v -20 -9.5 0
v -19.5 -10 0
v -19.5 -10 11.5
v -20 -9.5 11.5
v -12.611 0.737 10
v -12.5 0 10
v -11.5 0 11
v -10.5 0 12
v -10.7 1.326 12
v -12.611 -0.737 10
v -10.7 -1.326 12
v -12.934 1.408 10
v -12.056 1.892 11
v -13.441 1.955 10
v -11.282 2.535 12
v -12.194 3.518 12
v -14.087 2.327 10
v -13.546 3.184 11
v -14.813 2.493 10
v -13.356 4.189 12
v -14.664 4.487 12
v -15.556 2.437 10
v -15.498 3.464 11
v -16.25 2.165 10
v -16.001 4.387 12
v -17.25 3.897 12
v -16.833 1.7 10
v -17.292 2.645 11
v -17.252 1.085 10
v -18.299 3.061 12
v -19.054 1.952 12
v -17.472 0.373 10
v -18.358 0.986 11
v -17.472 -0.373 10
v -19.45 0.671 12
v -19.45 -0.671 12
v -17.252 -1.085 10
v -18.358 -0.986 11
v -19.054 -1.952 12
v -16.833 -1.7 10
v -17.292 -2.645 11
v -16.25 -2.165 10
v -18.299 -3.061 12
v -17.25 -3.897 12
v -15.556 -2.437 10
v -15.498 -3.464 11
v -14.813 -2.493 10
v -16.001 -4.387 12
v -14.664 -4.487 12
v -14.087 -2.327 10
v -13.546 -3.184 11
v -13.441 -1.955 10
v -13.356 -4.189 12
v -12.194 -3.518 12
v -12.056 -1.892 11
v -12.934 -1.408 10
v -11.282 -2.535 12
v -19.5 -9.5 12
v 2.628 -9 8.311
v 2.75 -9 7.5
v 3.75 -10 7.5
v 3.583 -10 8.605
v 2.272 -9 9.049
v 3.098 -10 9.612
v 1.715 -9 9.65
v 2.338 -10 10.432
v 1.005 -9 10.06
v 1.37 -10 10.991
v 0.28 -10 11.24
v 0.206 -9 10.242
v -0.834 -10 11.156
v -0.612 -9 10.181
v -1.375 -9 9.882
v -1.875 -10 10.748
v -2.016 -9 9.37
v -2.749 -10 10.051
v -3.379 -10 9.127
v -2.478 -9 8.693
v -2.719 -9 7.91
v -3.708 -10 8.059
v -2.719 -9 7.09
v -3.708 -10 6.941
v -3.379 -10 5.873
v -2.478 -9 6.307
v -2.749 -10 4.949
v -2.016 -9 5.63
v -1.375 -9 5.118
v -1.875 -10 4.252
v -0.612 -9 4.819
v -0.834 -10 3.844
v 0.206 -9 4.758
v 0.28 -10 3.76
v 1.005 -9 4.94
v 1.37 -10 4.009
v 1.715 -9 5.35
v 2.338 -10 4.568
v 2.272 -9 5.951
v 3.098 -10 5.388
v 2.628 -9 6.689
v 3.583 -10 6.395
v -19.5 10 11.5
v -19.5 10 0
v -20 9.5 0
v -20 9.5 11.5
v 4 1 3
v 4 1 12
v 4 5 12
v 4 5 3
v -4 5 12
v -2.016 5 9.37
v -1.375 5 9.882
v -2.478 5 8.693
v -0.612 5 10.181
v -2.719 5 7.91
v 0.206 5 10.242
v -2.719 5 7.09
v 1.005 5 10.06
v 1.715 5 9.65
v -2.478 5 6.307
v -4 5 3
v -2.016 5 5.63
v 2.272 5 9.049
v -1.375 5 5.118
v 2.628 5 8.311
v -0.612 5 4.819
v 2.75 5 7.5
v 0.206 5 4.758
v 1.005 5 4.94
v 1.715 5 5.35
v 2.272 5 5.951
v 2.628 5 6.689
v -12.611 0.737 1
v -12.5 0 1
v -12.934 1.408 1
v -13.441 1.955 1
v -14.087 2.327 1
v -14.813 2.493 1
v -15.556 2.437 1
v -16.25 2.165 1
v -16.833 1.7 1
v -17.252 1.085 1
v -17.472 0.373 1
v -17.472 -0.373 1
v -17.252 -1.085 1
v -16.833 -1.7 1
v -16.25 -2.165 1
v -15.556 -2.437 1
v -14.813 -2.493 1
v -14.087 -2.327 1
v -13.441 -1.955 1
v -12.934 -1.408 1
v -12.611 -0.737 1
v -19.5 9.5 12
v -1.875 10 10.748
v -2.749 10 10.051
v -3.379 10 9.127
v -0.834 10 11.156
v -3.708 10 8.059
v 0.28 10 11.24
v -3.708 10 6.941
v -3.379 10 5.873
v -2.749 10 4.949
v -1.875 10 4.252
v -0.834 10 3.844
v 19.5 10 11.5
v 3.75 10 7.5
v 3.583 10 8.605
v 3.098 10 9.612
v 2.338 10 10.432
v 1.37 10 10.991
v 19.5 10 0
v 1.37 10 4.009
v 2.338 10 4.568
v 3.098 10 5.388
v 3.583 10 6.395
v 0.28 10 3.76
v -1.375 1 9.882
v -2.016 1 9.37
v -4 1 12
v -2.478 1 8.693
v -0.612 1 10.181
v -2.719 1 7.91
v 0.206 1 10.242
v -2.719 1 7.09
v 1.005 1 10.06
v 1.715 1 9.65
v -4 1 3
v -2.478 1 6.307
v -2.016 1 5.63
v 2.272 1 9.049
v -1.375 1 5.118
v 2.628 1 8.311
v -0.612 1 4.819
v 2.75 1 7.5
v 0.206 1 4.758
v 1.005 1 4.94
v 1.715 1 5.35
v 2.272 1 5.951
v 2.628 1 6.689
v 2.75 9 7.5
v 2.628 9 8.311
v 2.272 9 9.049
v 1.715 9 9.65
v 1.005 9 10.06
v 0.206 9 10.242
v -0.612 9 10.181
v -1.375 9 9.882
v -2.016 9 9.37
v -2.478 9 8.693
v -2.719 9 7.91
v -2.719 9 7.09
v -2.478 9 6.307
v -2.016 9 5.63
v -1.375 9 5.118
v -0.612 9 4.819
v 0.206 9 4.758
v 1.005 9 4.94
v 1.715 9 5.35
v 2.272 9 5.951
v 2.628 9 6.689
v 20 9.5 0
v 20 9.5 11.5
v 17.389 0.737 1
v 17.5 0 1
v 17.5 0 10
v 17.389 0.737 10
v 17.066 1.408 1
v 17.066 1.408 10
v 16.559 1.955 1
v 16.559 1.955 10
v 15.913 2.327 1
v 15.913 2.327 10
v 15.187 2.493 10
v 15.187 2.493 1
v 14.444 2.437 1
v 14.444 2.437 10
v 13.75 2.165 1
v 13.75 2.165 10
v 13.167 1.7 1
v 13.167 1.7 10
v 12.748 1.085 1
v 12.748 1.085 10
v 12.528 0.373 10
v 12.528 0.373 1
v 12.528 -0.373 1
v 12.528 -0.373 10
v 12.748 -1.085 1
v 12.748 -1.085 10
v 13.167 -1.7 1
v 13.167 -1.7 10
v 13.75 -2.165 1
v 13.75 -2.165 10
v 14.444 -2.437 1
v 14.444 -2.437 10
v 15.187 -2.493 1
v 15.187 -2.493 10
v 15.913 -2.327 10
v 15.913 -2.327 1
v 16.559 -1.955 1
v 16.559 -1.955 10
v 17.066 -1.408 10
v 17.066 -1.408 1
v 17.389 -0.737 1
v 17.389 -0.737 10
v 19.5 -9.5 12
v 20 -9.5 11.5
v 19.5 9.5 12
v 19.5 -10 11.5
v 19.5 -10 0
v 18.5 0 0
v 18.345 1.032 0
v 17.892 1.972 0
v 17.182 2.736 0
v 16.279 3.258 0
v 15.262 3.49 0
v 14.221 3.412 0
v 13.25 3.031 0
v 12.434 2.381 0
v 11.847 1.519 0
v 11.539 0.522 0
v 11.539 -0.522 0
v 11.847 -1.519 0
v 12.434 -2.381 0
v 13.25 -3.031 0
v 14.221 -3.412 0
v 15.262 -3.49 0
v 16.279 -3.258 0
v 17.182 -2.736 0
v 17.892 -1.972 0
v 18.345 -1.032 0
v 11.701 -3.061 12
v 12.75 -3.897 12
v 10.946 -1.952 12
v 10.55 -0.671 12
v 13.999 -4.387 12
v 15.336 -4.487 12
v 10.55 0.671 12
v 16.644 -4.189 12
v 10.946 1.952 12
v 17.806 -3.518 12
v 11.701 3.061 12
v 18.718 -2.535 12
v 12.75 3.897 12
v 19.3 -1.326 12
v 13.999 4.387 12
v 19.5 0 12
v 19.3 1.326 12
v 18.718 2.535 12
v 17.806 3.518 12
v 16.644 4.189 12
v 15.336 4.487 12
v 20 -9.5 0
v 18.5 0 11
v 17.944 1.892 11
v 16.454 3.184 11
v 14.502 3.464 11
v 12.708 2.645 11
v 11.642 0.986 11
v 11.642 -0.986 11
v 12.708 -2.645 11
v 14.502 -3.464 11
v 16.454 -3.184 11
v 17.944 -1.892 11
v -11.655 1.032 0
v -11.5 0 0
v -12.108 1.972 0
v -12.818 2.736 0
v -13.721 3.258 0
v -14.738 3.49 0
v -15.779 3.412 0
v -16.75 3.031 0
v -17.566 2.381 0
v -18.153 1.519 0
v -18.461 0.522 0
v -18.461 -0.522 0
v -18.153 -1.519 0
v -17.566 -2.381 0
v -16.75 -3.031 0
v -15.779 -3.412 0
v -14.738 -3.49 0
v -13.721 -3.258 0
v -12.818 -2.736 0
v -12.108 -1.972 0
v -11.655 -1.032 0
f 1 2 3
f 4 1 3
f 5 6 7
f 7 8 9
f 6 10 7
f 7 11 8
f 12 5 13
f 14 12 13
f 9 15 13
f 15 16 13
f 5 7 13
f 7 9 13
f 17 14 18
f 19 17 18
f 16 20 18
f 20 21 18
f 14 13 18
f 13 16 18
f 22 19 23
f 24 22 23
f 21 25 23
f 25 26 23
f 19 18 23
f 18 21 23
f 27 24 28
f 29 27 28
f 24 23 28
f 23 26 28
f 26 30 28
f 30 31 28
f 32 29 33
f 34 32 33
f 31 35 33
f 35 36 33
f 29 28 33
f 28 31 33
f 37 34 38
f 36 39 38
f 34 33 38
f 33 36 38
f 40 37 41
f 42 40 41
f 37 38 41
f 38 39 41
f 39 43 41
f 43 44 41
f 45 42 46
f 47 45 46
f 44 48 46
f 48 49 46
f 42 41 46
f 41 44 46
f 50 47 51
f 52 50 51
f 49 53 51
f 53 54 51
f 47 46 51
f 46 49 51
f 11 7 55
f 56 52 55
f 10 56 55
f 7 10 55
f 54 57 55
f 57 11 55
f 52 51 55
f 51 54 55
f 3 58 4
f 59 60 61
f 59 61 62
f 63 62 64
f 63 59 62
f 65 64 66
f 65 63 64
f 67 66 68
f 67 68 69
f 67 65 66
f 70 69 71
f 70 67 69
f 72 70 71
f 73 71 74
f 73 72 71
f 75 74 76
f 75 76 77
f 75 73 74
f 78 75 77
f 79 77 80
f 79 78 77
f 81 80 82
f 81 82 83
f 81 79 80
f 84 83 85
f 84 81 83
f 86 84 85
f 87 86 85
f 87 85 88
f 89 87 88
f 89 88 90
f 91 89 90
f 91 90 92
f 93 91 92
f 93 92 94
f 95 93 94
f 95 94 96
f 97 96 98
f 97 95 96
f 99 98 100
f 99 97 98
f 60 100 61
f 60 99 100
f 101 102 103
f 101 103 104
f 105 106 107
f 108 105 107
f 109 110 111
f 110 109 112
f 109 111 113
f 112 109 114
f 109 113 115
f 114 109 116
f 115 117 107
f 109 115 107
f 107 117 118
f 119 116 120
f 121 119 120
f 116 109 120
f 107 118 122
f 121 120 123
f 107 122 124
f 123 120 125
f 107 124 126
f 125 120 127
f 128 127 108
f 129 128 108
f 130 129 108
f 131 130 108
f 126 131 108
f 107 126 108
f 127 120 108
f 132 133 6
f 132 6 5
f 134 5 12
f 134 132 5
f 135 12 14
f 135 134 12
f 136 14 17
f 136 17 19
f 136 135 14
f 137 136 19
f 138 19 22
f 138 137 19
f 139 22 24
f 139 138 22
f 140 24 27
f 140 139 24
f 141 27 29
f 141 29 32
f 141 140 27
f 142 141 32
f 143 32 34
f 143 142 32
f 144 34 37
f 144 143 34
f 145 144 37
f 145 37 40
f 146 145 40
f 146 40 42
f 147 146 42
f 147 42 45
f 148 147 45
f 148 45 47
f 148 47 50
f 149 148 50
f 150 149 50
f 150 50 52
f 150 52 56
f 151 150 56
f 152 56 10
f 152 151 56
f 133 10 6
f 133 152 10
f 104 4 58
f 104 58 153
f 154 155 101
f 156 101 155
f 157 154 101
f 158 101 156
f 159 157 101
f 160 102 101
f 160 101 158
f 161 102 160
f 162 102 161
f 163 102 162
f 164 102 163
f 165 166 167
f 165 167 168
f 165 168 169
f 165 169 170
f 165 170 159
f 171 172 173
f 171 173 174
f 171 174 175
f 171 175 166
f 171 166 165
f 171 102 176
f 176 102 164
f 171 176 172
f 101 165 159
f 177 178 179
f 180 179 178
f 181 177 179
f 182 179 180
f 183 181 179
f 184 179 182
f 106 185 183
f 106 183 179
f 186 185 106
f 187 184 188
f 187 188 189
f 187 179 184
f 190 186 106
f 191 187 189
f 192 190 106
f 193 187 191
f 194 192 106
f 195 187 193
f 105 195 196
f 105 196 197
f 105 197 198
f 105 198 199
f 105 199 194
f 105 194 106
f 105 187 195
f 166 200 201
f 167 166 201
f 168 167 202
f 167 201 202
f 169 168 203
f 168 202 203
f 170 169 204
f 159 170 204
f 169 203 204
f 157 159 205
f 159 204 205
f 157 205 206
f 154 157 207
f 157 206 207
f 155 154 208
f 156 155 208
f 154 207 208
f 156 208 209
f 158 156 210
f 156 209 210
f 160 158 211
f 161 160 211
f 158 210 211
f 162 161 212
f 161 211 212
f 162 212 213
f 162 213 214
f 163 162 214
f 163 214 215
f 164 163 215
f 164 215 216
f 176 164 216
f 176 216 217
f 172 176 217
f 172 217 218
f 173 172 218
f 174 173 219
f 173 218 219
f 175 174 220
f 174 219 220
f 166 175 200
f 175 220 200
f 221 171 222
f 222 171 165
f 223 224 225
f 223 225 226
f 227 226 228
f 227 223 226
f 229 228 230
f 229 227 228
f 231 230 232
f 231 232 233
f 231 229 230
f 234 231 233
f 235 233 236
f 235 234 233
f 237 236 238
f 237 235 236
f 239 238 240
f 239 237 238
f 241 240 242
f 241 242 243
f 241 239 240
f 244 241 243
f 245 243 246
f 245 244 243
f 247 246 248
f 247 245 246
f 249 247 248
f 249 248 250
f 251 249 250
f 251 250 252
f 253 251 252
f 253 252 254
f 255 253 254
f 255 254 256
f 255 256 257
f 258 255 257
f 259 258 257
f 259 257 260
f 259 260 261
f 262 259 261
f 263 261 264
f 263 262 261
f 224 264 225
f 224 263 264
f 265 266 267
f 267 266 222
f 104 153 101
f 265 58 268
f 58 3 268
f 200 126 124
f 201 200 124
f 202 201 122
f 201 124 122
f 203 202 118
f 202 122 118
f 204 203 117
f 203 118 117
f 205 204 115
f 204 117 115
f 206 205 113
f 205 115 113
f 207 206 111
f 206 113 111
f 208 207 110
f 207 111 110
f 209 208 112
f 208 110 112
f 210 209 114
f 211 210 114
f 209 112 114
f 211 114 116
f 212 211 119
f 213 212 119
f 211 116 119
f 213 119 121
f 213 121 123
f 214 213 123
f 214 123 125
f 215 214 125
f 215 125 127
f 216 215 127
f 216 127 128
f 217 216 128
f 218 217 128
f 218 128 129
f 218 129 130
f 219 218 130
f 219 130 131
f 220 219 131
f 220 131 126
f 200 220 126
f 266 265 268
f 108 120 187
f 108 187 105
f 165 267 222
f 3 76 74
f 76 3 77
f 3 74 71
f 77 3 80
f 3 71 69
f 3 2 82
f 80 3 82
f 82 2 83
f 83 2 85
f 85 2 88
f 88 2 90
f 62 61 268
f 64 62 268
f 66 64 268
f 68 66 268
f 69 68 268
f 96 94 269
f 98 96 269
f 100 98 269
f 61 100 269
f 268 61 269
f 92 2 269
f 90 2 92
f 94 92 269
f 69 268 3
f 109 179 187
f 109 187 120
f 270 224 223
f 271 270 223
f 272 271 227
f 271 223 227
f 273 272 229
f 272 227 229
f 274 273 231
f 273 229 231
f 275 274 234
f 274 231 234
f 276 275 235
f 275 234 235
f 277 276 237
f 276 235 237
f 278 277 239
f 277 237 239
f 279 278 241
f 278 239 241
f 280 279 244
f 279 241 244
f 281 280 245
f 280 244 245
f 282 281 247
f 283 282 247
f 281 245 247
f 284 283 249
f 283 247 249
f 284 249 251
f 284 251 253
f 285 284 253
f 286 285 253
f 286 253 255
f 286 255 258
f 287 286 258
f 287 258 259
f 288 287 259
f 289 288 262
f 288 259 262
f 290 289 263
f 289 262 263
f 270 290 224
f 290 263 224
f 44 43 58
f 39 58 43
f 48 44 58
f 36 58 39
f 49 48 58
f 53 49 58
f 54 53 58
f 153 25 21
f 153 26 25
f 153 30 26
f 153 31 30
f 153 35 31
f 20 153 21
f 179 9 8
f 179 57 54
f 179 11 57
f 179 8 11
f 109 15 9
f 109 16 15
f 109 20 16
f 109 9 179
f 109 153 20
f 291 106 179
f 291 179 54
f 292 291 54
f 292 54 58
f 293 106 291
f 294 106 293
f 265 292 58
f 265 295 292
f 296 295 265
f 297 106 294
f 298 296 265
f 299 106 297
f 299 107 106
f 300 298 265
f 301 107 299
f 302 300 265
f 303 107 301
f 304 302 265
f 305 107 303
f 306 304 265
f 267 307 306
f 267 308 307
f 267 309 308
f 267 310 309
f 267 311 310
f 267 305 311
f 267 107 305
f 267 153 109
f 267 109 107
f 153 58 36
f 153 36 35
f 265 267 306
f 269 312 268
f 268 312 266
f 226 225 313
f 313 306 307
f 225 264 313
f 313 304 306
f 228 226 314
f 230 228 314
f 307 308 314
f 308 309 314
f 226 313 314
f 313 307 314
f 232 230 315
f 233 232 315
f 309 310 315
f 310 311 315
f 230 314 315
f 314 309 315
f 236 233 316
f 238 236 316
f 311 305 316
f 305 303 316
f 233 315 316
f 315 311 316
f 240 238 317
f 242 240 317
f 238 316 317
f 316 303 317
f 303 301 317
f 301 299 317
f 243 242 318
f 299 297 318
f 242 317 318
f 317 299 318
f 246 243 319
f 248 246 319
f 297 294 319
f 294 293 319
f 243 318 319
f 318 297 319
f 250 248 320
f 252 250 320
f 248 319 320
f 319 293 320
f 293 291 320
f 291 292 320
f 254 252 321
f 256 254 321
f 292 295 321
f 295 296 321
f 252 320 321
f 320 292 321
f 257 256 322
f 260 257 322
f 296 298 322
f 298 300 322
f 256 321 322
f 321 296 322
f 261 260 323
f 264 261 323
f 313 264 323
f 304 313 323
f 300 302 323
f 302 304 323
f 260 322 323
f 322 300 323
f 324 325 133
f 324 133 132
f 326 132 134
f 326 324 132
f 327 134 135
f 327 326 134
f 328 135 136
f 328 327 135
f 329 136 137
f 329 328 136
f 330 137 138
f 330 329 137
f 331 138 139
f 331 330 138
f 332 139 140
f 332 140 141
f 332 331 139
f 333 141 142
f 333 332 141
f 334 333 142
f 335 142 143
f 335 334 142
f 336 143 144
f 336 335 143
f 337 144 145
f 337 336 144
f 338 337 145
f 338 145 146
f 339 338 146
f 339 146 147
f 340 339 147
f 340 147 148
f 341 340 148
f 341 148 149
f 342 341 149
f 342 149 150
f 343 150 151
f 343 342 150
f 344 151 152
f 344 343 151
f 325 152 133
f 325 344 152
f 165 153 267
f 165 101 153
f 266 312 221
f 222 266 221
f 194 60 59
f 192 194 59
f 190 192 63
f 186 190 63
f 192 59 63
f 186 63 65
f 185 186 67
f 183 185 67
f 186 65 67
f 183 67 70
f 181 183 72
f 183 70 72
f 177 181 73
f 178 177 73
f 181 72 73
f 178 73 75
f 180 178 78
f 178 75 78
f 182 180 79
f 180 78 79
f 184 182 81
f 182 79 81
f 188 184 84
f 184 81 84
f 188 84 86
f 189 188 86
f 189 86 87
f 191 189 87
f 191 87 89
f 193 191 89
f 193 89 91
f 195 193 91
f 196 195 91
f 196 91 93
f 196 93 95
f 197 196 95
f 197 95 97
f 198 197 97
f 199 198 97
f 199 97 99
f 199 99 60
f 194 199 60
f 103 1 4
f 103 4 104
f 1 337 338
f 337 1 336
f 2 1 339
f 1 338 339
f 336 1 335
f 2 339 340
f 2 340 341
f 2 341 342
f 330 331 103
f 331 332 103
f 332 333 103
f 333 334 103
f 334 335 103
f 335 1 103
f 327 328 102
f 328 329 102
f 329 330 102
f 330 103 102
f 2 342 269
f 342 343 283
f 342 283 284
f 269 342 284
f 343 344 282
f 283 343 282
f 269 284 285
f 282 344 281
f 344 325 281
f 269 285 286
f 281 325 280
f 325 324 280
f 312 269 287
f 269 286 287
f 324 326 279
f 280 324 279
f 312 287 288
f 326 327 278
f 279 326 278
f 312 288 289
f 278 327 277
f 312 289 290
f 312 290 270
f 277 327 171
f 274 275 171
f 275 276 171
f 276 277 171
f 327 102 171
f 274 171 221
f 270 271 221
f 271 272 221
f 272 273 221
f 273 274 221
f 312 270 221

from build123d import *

# Parameters (mm, degrees)
F0_W     = 40
F0_H     = 20
F0_R     = 2.5
F0_W_2   = 8
F0_H_2   = 4
F1_DEPTH = 12
F2_DEPTH = 3
F3_R     = 2.75
F4_DEPTH = 25
F5_SIZE  = 2
F6_SIZE  = 1
F7_SIZE  = 0.49999


# Not quite as in the source:
# - a fillet or chamfer is up to 0.001 mm smaller than in the source, because OpenCascade refuses the exact size


with BuildPart() as f1:
    # F0 (on Top) → F1 (new body)
    with BuildSketch(Plane.XY):
        Rectangle(F0_W, F0_H)
        with Locations((-15, 0)):
            Circle(F0_R, mode=Mode.SUBTRACT)
        with Locations((0, 3)):
            Rectangle(F0_W_2, F0_H_2, mode=Mode.SUBTRACT)
        with Locations((15, 0)):
            Circle(F0_R, mode=Mode.SUBTRACT)
    extrude(amount=F1_DEPTH)

    # F0 (on Top) → F2 (join)
    with BuildSketch(Plane.XY):
        with Locations((0, 3)):
            Rectangle(F0_W_2, F0_H_2)
    extrude(amount=F2_DEPTH)

    # F3 (on face) → F4 (cut)
    with BuildSketch(Plane.XZ.offset(10)):
        with Locations((0, 7.5)):
            Circle(F3_R)
    extrude(amount=-F4_DEPTH, mode=Mode.SUBTRACT)

    # F5
    f5_edges = [f1.edges().sort_by_distance(p)[0] for p in [
        (-17.5, 0, 12),
        (12.5, 0, 12),
    ]]
    chamfer(f5_edges, length=F5_SIZE)

    # F6
    f6_edges = [f1.edges().sort_by_distance(p)[0] for p in [
        (-2.75, 10, 7.5),
        (-17.5, 0, 0),
        (12.5, 0, 0),
        (-2.75, -10, 7.5),
    ]]
    chamfer(f6_edges, length=F6_SIZE)

    # F7 (size 0.5 in the source; OpenCascade refuses exactly that, so slightly less here)
    f7_edges = [f1.edges().sort_by_distance(p)[0] for p in [
        (0, 10, 12),
        (20, 0, 12),
        (0, -10, 12),
        (-20, 0, 12),
        (-20, 10, 6),
        (20, 10, 6),
        (20, -10, 6),
        (-20, -10, 6),
    ]]
    chamfer(f7_edges, length=F7_SIZE)


solid = f1.part
